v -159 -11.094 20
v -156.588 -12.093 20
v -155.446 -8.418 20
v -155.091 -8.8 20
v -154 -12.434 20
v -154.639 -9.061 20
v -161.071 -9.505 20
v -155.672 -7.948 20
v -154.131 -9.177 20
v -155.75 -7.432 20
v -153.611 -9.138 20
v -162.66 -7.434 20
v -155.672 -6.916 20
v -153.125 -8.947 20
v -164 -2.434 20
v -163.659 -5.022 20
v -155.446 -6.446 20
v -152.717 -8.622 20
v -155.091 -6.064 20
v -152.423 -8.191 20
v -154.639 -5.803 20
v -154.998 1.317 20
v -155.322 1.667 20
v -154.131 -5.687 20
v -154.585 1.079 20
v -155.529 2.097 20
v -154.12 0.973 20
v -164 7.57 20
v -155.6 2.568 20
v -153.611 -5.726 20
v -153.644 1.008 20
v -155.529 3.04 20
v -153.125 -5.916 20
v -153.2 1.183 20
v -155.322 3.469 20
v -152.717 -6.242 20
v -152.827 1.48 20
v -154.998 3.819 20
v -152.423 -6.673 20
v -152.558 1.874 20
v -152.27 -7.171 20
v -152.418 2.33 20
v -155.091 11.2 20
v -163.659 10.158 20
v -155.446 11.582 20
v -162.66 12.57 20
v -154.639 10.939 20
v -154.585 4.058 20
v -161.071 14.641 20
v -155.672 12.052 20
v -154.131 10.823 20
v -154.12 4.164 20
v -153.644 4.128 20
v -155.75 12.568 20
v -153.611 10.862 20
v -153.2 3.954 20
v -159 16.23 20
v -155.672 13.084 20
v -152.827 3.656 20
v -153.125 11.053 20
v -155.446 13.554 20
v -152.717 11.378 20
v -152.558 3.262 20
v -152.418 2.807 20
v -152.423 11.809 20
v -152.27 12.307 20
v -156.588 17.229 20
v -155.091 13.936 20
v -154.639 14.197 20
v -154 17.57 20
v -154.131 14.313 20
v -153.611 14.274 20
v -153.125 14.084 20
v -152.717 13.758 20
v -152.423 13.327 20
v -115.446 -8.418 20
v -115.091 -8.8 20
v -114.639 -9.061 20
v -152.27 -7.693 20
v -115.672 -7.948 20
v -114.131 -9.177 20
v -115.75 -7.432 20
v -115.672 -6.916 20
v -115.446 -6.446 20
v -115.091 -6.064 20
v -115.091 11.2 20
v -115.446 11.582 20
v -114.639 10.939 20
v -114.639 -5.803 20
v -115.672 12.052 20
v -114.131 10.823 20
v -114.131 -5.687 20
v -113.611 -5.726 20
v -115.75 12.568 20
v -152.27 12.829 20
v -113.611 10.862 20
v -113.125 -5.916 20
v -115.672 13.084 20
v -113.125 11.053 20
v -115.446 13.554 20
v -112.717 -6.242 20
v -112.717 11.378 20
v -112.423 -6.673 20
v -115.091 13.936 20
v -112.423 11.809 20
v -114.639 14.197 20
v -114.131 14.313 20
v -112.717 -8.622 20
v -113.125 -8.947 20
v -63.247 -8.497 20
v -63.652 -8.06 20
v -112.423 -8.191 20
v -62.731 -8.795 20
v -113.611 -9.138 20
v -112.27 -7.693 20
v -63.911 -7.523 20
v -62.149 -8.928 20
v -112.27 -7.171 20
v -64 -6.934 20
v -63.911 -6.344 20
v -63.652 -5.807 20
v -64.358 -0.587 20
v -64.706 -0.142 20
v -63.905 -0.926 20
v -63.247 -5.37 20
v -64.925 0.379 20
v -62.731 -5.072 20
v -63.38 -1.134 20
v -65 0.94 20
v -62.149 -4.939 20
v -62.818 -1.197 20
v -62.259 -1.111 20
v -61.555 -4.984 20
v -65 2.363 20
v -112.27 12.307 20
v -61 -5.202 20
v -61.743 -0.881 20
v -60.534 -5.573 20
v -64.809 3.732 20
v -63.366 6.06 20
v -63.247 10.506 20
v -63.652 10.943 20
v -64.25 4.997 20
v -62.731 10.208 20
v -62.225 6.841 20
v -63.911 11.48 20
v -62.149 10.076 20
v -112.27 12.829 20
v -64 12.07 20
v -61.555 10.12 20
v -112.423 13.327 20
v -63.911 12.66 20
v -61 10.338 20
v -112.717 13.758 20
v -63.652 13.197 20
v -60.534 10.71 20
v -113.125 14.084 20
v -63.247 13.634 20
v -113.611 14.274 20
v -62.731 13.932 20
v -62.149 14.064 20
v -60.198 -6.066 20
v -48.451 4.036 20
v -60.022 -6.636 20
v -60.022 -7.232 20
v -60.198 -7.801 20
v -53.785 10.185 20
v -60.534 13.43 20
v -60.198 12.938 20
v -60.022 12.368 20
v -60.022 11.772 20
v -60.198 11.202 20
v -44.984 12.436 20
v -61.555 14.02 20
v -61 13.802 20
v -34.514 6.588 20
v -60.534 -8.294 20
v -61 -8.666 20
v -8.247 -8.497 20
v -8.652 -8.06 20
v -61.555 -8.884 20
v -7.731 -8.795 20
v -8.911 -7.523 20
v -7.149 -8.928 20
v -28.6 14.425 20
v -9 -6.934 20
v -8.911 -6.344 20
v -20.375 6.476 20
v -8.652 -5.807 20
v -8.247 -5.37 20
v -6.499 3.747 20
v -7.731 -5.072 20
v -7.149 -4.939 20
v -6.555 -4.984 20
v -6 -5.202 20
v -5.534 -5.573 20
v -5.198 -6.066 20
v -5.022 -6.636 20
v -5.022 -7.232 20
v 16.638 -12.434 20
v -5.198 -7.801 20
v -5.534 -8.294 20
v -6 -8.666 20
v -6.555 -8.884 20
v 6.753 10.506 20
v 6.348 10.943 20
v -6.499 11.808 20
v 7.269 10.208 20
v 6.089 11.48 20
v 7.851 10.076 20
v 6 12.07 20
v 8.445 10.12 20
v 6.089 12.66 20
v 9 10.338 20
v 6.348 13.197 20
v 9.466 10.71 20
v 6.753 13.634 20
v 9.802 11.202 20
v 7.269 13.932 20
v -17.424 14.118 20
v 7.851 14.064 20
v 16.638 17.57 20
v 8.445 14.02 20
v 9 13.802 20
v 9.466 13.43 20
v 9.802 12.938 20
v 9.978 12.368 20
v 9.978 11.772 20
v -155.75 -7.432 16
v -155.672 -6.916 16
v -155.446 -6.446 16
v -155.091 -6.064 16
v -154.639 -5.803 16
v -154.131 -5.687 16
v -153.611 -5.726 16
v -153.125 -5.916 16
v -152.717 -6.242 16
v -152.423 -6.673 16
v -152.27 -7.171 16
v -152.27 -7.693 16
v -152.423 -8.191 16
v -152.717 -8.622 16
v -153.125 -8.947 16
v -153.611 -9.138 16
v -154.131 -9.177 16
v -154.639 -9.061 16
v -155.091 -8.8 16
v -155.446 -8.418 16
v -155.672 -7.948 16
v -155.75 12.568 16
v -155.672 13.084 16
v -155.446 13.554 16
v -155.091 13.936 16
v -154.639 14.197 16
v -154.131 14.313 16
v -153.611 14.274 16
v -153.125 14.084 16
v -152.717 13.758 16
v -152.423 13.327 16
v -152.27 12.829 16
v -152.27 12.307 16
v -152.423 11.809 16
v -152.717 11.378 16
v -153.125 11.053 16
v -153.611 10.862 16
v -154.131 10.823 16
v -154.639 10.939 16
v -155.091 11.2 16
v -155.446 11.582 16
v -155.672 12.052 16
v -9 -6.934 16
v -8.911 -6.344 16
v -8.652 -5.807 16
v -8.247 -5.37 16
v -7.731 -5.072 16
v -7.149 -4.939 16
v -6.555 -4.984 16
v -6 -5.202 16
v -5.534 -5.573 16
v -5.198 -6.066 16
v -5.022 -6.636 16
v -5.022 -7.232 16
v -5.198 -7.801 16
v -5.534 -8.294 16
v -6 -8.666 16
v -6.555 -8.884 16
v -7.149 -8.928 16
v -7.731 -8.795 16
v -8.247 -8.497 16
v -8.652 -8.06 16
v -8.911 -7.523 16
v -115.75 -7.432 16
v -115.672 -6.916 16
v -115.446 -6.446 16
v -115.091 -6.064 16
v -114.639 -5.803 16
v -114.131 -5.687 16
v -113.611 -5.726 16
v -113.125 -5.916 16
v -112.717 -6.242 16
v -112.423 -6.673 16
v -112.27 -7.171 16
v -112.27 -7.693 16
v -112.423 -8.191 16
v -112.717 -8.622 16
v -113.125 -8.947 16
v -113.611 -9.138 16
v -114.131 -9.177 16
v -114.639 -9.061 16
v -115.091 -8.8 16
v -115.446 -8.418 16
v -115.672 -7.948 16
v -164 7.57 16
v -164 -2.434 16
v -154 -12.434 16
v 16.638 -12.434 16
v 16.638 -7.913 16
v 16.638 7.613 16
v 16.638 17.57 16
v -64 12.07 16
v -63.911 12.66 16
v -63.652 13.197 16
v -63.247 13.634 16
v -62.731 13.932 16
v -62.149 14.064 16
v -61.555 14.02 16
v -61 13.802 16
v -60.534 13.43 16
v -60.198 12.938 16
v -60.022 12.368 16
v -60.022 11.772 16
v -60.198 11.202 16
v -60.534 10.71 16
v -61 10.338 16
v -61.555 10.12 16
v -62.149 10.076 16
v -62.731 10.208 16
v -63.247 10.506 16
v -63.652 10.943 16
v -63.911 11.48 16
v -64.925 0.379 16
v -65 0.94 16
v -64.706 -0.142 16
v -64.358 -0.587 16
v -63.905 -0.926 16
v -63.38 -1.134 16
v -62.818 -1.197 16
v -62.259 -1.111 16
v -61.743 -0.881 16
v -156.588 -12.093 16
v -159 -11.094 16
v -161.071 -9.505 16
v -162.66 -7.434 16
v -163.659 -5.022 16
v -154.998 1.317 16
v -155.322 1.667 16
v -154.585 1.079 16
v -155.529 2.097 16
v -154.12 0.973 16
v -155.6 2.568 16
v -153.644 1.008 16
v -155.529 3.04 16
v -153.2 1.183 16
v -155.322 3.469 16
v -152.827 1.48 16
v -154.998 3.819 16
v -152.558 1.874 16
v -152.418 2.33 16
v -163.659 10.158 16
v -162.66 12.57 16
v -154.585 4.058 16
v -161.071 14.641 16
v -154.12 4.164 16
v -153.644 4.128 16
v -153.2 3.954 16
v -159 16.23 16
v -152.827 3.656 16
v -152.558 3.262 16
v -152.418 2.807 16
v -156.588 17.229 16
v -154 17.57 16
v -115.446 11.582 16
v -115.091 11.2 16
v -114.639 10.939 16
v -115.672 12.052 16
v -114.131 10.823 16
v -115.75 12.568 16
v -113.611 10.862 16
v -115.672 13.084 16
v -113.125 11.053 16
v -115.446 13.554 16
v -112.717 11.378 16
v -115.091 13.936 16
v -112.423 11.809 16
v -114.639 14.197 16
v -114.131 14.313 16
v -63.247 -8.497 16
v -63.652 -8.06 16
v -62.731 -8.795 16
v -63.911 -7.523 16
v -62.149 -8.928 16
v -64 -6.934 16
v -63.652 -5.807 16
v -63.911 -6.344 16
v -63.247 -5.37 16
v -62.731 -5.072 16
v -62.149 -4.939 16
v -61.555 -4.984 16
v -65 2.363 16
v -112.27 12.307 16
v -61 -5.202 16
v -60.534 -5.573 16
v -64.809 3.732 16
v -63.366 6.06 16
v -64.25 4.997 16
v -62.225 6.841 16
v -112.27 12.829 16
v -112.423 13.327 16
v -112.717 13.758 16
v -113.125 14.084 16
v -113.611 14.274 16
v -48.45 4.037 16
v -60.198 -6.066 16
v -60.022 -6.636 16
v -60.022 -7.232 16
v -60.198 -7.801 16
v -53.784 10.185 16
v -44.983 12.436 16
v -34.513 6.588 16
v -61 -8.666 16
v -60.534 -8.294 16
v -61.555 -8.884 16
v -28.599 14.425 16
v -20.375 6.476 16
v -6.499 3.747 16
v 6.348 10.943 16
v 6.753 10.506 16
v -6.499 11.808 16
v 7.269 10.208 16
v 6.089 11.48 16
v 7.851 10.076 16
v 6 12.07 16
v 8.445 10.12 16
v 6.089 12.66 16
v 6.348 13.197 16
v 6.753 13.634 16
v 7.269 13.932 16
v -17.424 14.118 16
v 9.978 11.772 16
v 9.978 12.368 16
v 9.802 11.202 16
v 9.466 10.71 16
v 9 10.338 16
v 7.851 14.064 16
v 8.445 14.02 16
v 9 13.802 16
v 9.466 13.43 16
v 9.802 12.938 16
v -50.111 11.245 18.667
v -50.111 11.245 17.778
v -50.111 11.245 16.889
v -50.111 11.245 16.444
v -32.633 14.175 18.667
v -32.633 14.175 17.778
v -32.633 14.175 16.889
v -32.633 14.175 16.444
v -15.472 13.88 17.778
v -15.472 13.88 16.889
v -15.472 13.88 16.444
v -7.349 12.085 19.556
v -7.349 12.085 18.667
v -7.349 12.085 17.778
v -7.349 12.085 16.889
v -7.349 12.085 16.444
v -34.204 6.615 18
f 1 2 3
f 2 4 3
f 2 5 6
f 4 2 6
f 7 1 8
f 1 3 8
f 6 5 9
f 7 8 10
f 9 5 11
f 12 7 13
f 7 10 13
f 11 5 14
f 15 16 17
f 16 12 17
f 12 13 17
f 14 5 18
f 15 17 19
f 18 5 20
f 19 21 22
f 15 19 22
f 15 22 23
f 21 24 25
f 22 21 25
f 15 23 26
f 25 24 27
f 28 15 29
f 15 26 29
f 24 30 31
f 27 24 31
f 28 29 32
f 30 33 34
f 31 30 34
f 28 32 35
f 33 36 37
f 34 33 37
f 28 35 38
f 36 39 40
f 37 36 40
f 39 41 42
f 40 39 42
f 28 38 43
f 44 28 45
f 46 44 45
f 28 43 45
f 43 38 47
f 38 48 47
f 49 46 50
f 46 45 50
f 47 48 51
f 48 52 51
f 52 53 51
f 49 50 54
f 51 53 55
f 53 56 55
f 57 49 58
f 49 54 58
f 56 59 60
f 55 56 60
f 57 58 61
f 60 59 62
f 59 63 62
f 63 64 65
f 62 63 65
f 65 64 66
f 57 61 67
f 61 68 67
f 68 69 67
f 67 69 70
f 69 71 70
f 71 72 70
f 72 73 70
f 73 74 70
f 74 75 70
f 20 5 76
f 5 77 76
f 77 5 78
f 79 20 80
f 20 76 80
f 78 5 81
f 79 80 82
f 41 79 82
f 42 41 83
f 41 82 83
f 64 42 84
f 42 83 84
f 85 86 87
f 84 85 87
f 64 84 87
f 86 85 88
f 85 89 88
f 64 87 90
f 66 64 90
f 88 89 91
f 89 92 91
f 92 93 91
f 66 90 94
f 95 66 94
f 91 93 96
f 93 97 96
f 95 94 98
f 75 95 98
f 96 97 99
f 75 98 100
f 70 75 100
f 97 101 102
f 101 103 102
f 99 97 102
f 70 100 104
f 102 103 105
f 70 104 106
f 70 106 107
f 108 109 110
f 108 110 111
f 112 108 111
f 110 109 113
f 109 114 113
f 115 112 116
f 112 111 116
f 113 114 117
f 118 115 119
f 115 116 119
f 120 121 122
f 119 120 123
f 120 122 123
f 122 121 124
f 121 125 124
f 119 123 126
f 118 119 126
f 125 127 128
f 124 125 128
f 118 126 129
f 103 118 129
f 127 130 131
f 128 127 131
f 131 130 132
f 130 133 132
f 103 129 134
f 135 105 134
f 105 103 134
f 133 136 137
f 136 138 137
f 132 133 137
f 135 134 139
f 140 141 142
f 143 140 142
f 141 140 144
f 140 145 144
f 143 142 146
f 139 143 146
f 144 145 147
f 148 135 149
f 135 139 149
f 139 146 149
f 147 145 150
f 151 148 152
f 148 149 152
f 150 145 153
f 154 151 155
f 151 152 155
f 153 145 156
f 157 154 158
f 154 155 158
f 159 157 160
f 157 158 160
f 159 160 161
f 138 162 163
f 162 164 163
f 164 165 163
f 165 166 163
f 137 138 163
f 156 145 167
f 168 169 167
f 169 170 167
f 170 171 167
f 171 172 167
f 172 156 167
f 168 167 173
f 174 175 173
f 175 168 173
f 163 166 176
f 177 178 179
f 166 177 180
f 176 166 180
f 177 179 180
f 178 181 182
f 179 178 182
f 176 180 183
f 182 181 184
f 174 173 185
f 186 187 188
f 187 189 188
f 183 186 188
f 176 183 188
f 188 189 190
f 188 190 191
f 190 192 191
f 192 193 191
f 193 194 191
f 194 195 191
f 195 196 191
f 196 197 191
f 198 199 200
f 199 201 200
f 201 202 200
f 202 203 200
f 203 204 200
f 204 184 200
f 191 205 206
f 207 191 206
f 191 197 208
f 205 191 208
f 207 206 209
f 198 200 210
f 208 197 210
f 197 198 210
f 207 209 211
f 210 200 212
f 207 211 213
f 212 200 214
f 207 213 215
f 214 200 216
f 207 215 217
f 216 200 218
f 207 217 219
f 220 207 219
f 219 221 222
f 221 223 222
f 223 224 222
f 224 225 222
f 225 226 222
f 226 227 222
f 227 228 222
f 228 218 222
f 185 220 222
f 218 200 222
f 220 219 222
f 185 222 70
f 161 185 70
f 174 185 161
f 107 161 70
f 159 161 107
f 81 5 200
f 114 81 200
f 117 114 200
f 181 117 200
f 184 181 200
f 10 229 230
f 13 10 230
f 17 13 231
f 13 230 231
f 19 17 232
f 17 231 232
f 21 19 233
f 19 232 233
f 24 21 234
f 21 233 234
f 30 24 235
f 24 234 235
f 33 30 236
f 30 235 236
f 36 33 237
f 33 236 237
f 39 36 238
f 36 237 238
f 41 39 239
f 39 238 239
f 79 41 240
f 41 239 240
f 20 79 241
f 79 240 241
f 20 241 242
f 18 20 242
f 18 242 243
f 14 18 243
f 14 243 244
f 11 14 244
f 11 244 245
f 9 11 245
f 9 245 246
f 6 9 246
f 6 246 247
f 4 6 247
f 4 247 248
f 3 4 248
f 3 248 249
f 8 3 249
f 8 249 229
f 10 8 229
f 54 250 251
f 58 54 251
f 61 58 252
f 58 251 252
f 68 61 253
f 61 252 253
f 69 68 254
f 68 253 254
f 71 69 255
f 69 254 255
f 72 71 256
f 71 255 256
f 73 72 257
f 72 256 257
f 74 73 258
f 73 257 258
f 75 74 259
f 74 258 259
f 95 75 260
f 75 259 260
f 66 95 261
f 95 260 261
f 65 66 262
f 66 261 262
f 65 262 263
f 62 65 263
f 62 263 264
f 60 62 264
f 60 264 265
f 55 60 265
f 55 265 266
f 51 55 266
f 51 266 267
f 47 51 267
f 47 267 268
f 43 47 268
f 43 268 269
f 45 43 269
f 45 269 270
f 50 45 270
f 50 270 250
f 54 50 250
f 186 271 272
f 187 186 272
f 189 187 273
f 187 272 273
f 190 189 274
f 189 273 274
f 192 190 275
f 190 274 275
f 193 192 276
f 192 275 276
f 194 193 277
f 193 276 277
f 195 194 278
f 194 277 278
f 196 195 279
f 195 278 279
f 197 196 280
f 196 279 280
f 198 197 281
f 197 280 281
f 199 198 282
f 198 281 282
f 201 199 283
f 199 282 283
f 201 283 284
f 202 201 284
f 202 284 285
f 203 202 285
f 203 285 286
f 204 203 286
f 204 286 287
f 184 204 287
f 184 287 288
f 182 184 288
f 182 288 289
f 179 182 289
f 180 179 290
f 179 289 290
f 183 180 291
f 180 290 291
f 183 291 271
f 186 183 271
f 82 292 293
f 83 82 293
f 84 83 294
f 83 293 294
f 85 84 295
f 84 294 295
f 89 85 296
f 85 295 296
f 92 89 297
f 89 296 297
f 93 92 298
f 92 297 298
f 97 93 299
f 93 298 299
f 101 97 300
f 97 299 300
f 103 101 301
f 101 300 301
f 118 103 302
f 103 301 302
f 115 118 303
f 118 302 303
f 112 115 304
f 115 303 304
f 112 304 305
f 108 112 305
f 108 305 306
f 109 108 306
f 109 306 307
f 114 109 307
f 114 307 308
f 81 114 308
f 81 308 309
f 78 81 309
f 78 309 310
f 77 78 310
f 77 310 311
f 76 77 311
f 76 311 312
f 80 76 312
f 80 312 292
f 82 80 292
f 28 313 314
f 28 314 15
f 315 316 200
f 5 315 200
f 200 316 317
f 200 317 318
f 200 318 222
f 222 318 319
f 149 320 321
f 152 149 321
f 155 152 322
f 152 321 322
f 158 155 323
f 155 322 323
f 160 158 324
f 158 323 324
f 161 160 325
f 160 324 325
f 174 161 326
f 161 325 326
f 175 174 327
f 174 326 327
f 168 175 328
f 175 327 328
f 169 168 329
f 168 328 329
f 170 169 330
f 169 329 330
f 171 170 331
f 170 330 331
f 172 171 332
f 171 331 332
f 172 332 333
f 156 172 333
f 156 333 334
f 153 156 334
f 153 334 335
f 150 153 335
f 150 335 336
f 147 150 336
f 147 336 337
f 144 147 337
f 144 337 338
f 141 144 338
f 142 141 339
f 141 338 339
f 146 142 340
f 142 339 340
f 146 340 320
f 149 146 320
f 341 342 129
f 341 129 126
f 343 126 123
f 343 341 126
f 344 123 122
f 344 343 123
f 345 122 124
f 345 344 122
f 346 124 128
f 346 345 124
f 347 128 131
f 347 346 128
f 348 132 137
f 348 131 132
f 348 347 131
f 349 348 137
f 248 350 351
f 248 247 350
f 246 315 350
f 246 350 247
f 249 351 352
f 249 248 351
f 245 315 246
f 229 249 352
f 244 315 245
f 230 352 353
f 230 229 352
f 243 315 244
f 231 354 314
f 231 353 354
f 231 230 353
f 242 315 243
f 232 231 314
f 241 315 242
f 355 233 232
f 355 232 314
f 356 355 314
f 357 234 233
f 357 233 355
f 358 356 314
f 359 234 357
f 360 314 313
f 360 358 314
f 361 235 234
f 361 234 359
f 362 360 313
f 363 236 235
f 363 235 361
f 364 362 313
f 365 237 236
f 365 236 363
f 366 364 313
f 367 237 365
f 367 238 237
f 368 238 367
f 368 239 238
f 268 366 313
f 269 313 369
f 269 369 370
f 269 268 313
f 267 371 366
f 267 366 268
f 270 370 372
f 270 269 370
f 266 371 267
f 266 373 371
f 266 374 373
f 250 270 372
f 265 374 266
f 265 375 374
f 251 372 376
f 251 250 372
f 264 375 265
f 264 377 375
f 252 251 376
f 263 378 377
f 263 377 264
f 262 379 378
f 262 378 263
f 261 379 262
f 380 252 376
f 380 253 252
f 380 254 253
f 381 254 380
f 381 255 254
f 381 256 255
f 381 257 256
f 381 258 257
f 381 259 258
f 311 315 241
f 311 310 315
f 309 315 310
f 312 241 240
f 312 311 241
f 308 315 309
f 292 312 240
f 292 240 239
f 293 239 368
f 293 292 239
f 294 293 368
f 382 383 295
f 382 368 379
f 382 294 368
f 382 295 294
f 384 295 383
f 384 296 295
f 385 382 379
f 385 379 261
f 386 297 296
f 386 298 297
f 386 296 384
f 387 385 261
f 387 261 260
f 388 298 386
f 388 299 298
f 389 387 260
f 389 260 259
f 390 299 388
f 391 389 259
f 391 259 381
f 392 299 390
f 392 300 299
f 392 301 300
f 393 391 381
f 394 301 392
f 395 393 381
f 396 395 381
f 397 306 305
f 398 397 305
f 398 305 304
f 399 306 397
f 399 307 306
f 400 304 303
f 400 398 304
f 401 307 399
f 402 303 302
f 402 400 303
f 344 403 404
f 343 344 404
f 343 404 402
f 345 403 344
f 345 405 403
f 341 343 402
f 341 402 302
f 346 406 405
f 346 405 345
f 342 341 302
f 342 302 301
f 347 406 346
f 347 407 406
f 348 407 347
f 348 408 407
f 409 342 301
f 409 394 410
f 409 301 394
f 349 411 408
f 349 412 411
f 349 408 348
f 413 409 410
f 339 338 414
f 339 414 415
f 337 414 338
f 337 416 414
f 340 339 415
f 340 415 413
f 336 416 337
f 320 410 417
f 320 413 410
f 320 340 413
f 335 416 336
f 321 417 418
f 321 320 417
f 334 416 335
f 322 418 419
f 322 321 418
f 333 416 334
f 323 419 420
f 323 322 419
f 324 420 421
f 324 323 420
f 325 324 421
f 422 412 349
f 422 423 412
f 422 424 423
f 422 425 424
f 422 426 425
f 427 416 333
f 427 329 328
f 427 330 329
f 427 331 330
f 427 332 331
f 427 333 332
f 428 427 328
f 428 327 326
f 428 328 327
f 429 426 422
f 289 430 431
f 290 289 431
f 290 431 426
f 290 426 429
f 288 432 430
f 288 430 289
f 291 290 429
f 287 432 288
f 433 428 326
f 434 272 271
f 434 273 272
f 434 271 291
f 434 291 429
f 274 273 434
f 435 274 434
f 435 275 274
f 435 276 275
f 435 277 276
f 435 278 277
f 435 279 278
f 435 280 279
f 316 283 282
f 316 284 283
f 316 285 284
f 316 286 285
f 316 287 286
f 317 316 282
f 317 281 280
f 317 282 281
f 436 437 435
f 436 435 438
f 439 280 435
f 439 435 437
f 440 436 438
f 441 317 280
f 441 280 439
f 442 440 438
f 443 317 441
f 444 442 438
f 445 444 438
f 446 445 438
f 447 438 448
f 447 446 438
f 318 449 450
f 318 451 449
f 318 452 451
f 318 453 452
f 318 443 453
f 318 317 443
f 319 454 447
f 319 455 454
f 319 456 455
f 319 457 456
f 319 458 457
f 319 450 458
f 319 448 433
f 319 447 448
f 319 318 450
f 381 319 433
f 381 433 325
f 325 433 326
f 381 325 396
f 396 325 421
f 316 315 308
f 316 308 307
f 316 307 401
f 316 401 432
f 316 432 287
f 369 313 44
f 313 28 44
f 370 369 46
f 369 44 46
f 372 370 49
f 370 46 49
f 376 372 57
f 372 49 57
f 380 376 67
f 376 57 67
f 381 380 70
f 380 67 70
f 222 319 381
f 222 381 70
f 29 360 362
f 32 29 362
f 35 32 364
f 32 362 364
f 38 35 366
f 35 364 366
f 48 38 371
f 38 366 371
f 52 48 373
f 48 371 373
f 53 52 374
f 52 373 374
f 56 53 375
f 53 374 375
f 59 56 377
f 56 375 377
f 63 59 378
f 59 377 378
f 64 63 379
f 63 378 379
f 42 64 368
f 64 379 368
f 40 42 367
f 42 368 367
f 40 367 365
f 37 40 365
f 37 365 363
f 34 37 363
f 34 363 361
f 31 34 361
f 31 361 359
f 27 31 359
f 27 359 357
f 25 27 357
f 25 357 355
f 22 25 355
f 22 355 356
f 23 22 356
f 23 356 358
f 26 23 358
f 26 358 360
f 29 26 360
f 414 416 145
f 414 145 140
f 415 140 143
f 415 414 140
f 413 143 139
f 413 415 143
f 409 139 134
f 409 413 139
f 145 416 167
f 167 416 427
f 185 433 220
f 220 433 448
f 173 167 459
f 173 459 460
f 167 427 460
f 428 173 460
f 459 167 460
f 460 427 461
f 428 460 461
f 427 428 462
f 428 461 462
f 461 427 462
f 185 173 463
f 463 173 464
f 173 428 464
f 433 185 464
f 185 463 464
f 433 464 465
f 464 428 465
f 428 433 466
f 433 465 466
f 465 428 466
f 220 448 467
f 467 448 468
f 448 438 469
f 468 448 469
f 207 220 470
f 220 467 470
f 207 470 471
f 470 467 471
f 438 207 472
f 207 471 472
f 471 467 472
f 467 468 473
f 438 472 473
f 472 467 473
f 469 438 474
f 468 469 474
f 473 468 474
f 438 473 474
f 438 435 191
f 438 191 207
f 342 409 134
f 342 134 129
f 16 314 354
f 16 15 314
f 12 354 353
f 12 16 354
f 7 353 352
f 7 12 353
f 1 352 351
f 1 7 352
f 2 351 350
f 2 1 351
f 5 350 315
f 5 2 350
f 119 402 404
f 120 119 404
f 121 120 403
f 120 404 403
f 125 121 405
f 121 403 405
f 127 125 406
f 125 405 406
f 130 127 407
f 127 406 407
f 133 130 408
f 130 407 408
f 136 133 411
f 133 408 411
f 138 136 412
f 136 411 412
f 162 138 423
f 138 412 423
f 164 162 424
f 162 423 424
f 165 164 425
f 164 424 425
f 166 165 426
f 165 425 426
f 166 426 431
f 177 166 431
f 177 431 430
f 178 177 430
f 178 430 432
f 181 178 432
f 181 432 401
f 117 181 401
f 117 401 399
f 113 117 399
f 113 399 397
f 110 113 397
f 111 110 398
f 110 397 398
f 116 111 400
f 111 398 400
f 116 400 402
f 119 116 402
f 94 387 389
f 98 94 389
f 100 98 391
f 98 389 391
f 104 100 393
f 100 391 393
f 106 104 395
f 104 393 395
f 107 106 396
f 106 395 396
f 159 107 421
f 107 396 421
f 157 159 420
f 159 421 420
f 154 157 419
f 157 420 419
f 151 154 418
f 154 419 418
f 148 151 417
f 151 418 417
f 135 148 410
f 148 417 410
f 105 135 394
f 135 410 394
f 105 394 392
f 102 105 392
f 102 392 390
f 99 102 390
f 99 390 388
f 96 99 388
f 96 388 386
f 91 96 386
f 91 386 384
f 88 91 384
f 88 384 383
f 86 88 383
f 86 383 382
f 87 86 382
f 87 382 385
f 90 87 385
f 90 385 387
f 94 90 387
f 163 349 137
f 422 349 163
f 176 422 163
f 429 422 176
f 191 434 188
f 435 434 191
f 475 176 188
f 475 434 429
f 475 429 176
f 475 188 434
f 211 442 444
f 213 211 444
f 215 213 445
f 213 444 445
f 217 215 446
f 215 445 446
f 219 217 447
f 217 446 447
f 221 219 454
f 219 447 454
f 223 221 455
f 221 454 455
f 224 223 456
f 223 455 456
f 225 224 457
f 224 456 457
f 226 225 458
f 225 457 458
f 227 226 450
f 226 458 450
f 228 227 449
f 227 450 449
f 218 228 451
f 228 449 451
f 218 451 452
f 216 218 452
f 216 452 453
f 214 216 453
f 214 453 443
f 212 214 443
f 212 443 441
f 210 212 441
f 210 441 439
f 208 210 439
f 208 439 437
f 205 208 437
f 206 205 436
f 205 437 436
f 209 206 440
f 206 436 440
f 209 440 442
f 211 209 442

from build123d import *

# Parameters (mm, degrees)
SKETCH_1_W           = 140
SKETCH_1_H           = 40
EXTRUDE_1_DEPTH      = 35
CUT_EXTRUDE_START    = -25
CUT_EXTRUDE_1_DEPTH  = 25
SKETCH_3_W           = 20.946458808
SKETCH_3_H           = 40
CUT_EXTRUDE_2_DEPTH  = 50
SKETCH_4_W           = 119.053541192
SKETCH_4_H           = 40
CUT_EXTRUDE_3_DEPTH  = 16
SKETCH_5_W           = 119.053541192
SKETCH_5_H           = 7.566301572
CUT_EXTRUDE_4_DEPTH  = 33
FILLET_1_R           = 5
SKETCH_6_W           = 119.053541192
SKETCH_6_H           = 32.433698428
EXTRUDE_2_DEPTH      = 3
SKETCH_7_W           = 119.053541192
SKETCH_7_H           = 2.43
CUT_EXTRUDE_5_DEPTH  = 25
FILLET_2_R           = 15
SKETCH_10_W          = 35.667768889
SKETCH_10_H          = 41.429485403
CUT_EXTRUDE_8_DEPTH  = 50
SKETCH_11_W          = 23.137651911
SKETCH_11_H          = 30.003698428
EXTRUDE_3_DEPTH      = 19
SKETCH_12_W          = 18
SKETCH_12_H          = 30.003698428
CUT_EXTRUDE_9_DEPTH  = 150
SKETCH_8_R           = 2
CUT_EXTRUDE_10_DEPTH = 4
SKETCH_13_W          = 4
SKETCH_13_H          = 30.003698428
EXTRUDE_4_DEPTH      = 94
SKETCH_14_R          = 1.6
SKETCH_14_R_2        = 1.75
CUT_EXTRUDE_11_DEPTH = 94
FILLET_4_R           = 10


# Read off the part's stored shape, not the designer's step: 切除-拉伸1
with BuildPart() as part:
    # 草图1 → 凸台-拉伸1 (new body)
    with BuildSketch(Plane.XY):
        Rectangle(SKETCH_1_W, SKETCH_1_H)
    extrude(amount=EXTRUDE_1_DEPTH)

    # 切除-拉伸1 outline → 切除-拉伸1 (cut)
    with BuildSketch(Plane.XY.offset(35).offset(CUT_EXTRUDE_START)):
        with BuildLine():
            ThreePointArc((-65, 0.939701666), (-63.90540849, -0.926084141), (-61.742713718, -0.880933602))
            add(Edge.make_bspline(
                [(-61.742713718, -0.880933602), (-32.663633491, 12.545599653), (-3.21353823, 2.722880029)],
                knots=[0, 0, 0, 1, 1, 1], degree=2))
            add(Edge.make_bspline(
                [(-3.21353823, 2.722880029), (7.778991577, -3.486736981), (19.521763095, -12.075038105), (32.974458778, -10.310789055)],
                knots=[0, 0, 0, 0, 1, 1, 1, 1], degree=3))
            add(Edge.make_bspline(
                [(-1.265226953, 9.621082728), (5.319961167, 7.826511536), (19.072649984, 4.273931772), (30.116773563, 18.680420492), (50.141031873, 7.903163107), (40.152384038, -8.700046956), (32.974458778, -10.310789055)],
                knots=[0, 0, 0, 0, 0.327114299, 0.472643013, 0.672292196, 1, 1, 1, 1], degree=3))
            add(Edge.make_bspline(
                [(-62.225486261, 6.840593766), (-61.950401652, 6.977325912), (-60.645663364, 7.609645854), (-56.787258029, 9.270913685), (-50.206414035, 11.371256832), (-41.494158434, 13.209404155), (-32.600965324, 14.299233241), (-23.90205386, 14.645800276), (-15.41426271, 14.074279585), (-7.837972032, 12.457111584), (-3.215945129, 10.610499943), (-1.265226953, 9.621082728)],
                knots=[0.117371432, 0.117371432, 0.117371432, 0.117371432, 0.12919832, 0.172962492, 0.2758611, 0.378759707, 0.481658315, 0.584556923, 0.687455531, 0.790354139, 0.871867558, 0.871867558, 0.871867558, 0.871867558], degree=3))
            ThreePointArc((-62.225486261, 6.840593766), (-64.250143015, 4.996865242), (-65, 2.363182583))
            Line((-65, 2.363182583), (-65, 0.939701666))
        make_face()
    extrude(amount=CUT_EXTRUDE_1_DEPTH, mode=Mode.SUBTRACT)

    # 草图3 → 切除-拉伸2 (cut)
    with BuildSketch(Plane.XY.offset(35)):
        with Locations((59.526770596, 0)):
            Rectangle(SKETCH_3_W, SKETCH_3_H)
    extrude(amount=-CUT_EXTRUDE_2_DEPTH, mode=Mode.SUBTRACT)

    # 草图4 → 切除-拉伸3 (cut)
    with BuildSketch(Plane(origin=(0, 0, 0), x_dir=(-1, 0, 0), z_dir=(0, 0, -1))):
        with Locations((10.473229404, 0)):
            Rectangle(SKETCH_4_W, SKETCH_4_H)
    extrude(amount=-CUT_EXTRUDE_3_DEPTH, mode=Mode.SUBTRACT)

    # 草图5 → 切除-拉伸4 (cut)
    with BuildSketch(Plane.XY.offset(35)):
        with Locations((-10.473229404, -16.216849214)):
            Rectangle(SKETCH_5_W, SKETCH_5_H)
    extrude(amount=-CUT_EXTRUDE_4_DEPTH, mode=Mode.SUBTRACT)

    # 圆角1
    fillet_1_edges = [part.edges().sort_by_distance(p)[0] for p in [
        (-3.21353823, 2.722880029, 25.5),
        (-1.265226953, 9.621082728, 25.5),
    ]]
    fillet(fillet_1_edges, radius=FILLET_1_R)

    # 草图6 → 凸台-拉伸2 (add)
    with BuildSketch(Plane.XY.offset(35)):
        with Locations((-10.473229404, 3.783150786)):
            Rectangle(SKETCH_6_W, SKETCH_6_H)
    extrude(amount=EXTRUDE_2_DEPTH)

    # 草图7 → 切除-拉伸5 (cut)
    with BuildSketch(Plane(origin=(0, 0, 16), x_dir=(-1, 0, 0), z_dir=(0, 0, -1))):
        with Locations((10.473229404, 18.785)):
            Rectangle(SKETCH_7_W, SKETCH_7_H)
    extrude(amount=-CUT_EXTRUDE_5_DEPTH, mode=Mode.SUBTRACT)

    # 圆角2
    fillet_2_edges = [part.edges().sort_by_distance(p)[0] for p in [
        (49.053541192, 17.57, 27),
        (49.053541192, -12.433698428, 27),
    ]]
    fillet(fillet_2_edges, radius=FILLET_2_R)

    # 草图10 → 切除-拉伸8 (cut)
    with BuildSketch(Plane(origin=(0, 0, 16), x_dir=(-1, 0, 0), z_dir=(0, 0, -1))):
        with Locations((-34.472180194, 2.38587436)):
            Rectangle(SKETCH_10_W, SKETCH_10_H)
    extrude(amount=-CUT_EXTRUDE_8_DEPTH, mode=Mode.SUBTRACT)

    # 草图11 → 凸台-拉伸3 (add)
    with BuildSketch(Plane(origin=(0, 0, 16), x_dir=(-1, 0, 0), z_dir=(0, 0, -1))):
        with Locations((-5.069469793, 2.568150786)):
            Rectangle(SKETCH_11_W, SKETCH_11_H)
    extrude(amount=-EXTRUDE_3_DEPTH)

    # 草图12 → 切除-拉伸9 (cut)
    with BuildSketch(Plane.ZY.offset(70)):
        with Locations((29, 2.568150786)):
            Rectangle(SKETCH_12_W, SKETCH_12_H)
    extrude(amount=-CUT_EXTRUDE_9_DEPTH, mode=Mode.SUBTRACT)

    # 草图8 → 切除-拉伸10 (cut)
    with BuildSketch(Plane(origin=(0, 0, 16), x_dir=(-1, 0, 0), z_dir=(0, 0, -1))):
        with Locations((62, 12.07)):
            Circle(SKETCH_8_R)
        with Locations((-8, 12.07)):
            Circle(SKETCH_8_R)
        with Locations((62, -6.933698428)):
            Circle(SKETCH_8_R)
        with Locations((7, -6.933698428)):
            Circle(SKETCH_8_R)
    extrude(amount=-CUT_EXTRUDE_10_DEPTH, mode=Mode.SUBTRACT)

    # 草图13 → 凸台-拉伸4 (add)
    with BuildSketch(Plane.ZY.offset(70)):
        with Locations((18, 2.568150786)):
            Rectangle(SKETCH_13_W, SKETCH_13_H)
    extrude(amount=EXTRUDE_4_DEPTH)

    # 草图14 → 切除-拉伸11 (cut)
    with BuildSketch(Plane(origin=(0, 0, 16), x_dir=(-1, 0, 0), z_dir=(0, 0, -1))):
        with Locations((154, 2.568150786)):
            Circle(SKETCH_14_R)
        with Locations((114, 12.568150786)):
            Circle(SKETCH_14_R_2)
        with Locations((154, 12.568150786)):
            Circle(SKETCH_14_R_2)
        with Locations((154, -7.431849214)):
            Circle(SKETCH_14_R_2)
        with Locations((114, -7.431849214)):
            Circle(SKETCH_14_R_2)
    extrude(amount=-CUT_EXTRUDE_11_DEPTH, mode=Mode.SUBTRACT)

    # 圆角4
    fillet_4_edges = [part.edges().sort_by_distance(p)[0] for p in [
        (-164, -12.433698428, 18),
        (-164, 17.57, 18),
    ]]
    fillet(fillet_4_edges, radius=FILLET_4_R)


solid = part.part
